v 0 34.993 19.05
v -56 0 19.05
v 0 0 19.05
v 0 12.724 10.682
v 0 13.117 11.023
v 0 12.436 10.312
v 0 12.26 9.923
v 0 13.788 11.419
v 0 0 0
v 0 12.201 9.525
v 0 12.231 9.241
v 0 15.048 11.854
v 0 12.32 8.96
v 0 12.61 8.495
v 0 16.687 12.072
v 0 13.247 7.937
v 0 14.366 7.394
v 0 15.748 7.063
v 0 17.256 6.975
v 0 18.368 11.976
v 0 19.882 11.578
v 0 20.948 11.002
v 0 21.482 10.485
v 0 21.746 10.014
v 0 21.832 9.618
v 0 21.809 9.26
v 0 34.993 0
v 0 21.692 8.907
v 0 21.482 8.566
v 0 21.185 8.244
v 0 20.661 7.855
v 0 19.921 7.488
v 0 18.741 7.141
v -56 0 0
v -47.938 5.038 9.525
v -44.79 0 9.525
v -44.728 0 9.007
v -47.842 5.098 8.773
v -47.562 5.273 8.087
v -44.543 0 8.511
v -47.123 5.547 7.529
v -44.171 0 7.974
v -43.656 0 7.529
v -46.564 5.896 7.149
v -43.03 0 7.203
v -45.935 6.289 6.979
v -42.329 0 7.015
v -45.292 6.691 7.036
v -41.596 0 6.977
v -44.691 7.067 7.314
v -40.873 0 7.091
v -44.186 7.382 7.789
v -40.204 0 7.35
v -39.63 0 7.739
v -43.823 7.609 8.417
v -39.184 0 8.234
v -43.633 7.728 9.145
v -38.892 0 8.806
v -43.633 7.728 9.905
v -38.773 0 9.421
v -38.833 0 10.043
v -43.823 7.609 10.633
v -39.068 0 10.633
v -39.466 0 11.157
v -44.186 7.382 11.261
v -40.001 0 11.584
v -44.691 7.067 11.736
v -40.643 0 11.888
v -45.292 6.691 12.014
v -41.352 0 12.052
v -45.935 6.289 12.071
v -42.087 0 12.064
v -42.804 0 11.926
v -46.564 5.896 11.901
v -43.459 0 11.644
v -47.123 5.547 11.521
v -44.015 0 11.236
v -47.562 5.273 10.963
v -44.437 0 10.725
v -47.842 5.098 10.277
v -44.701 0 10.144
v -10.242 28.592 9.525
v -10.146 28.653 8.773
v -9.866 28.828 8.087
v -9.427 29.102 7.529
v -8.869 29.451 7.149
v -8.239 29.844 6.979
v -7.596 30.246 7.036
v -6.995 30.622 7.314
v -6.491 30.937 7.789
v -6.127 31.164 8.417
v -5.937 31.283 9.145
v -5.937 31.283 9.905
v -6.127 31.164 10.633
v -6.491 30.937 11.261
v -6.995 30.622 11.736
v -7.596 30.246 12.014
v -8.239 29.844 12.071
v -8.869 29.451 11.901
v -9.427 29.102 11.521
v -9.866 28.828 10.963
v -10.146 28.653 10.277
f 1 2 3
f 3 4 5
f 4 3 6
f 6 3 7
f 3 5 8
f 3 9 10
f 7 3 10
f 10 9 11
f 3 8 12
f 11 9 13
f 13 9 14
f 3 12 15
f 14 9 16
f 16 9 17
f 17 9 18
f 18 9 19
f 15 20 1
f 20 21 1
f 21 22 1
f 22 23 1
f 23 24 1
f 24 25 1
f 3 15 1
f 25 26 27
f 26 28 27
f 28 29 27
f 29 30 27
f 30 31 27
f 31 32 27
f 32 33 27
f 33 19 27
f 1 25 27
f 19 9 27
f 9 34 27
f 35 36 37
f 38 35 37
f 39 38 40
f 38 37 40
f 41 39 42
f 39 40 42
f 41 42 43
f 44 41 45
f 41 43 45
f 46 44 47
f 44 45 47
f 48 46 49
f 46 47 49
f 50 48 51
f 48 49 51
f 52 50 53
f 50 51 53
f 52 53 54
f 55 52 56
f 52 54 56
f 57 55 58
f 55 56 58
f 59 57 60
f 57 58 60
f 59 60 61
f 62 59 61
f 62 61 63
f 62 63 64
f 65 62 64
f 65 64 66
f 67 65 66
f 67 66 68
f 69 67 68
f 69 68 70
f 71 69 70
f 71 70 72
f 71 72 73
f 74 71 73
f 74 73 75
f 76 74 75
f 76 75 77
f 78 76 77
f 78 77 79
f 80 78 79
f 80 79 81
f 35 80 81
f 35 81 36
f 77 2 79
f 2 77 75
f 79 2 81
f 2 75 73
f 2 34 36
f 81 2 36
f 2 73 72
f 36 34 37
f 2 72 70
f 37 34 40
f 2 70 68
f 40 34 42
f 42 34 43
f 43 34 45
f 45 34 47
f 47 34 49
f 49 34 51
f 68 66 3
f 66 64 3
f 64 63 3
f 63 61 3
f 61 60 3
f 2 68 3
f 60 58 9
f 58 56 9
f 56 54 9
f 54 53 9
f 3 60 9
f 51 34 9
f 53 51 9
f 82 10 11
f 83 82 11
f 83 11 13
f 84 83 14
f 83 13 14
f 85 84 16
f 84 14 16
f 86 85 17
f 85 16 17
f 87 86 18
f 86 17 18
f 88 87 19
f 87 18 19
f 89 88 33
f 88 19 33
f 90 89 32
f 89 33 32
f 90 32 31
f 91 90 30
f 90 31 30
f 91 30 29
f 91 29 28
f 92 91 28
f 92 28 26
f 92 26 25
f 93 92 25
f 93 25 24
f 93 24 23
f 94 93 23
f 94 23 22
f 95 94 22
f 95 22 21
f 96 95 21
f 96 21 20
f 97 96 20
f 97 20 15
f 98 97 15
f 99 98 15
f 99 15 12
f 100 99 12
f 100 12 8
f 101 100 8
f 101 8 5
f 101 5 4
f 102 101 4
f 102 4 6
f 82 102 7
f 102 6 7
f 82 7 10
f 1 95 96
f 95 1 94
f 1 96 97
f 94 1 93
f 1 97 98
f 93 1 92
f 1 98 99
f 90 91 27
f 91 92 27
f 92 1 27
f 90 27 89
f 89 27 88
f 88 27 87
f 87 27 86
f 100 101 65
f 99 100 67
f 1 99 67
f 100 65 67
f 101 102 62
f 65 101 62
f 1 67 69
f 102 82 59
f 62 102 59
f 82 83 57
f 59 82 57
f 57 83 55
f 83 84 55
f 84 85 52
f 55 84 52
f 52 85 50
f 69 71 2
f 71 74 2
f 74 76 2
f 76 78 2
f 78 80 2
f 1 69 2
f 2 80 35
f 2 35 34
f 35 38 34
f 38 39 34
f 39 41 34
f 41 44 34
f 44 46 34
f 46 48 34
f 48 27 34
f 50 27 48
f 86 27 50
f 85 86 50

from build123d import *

# Parameters (mm, degrees)
BOSS_EXTRUDE1_DEPTH            = 19.05
F_7_0_201_DIAMETER_HOLE1_D     = 5.1054
F_7_0_201_DIAMETER_HOLE1_DEPTH = 25.4


with BuildPart() as part:
    # Sketch2 → Boss-Extrude1 (new body)
    with BuildSketch(Plane.XY):
        Polygon((0, 0), (0, 34.992683716), (-56.000000014, 0), align=None)
    extrude(amount=BOSS_EXTRUDE1_DEPTH)

    # #7 (0.201) Diameter Hole1
    with Locations(Plane(origin=(-15.725607894, 25.166233303, 0), x_dir=(0.8480480961564308, 0.5299192642331972, 0), z_dir=(-0.5299192642331972, 0.848048096156431, 0))):
        with Locations((-35.431702792, -9.525), (9.018297208, -9.525)):
            Hole(F_7_0_201_DIAMETER_HOLE1_D / 2, depth=F_7_0_201_DIAMETER_HOLE1_DEPTH)


solid = part.part
